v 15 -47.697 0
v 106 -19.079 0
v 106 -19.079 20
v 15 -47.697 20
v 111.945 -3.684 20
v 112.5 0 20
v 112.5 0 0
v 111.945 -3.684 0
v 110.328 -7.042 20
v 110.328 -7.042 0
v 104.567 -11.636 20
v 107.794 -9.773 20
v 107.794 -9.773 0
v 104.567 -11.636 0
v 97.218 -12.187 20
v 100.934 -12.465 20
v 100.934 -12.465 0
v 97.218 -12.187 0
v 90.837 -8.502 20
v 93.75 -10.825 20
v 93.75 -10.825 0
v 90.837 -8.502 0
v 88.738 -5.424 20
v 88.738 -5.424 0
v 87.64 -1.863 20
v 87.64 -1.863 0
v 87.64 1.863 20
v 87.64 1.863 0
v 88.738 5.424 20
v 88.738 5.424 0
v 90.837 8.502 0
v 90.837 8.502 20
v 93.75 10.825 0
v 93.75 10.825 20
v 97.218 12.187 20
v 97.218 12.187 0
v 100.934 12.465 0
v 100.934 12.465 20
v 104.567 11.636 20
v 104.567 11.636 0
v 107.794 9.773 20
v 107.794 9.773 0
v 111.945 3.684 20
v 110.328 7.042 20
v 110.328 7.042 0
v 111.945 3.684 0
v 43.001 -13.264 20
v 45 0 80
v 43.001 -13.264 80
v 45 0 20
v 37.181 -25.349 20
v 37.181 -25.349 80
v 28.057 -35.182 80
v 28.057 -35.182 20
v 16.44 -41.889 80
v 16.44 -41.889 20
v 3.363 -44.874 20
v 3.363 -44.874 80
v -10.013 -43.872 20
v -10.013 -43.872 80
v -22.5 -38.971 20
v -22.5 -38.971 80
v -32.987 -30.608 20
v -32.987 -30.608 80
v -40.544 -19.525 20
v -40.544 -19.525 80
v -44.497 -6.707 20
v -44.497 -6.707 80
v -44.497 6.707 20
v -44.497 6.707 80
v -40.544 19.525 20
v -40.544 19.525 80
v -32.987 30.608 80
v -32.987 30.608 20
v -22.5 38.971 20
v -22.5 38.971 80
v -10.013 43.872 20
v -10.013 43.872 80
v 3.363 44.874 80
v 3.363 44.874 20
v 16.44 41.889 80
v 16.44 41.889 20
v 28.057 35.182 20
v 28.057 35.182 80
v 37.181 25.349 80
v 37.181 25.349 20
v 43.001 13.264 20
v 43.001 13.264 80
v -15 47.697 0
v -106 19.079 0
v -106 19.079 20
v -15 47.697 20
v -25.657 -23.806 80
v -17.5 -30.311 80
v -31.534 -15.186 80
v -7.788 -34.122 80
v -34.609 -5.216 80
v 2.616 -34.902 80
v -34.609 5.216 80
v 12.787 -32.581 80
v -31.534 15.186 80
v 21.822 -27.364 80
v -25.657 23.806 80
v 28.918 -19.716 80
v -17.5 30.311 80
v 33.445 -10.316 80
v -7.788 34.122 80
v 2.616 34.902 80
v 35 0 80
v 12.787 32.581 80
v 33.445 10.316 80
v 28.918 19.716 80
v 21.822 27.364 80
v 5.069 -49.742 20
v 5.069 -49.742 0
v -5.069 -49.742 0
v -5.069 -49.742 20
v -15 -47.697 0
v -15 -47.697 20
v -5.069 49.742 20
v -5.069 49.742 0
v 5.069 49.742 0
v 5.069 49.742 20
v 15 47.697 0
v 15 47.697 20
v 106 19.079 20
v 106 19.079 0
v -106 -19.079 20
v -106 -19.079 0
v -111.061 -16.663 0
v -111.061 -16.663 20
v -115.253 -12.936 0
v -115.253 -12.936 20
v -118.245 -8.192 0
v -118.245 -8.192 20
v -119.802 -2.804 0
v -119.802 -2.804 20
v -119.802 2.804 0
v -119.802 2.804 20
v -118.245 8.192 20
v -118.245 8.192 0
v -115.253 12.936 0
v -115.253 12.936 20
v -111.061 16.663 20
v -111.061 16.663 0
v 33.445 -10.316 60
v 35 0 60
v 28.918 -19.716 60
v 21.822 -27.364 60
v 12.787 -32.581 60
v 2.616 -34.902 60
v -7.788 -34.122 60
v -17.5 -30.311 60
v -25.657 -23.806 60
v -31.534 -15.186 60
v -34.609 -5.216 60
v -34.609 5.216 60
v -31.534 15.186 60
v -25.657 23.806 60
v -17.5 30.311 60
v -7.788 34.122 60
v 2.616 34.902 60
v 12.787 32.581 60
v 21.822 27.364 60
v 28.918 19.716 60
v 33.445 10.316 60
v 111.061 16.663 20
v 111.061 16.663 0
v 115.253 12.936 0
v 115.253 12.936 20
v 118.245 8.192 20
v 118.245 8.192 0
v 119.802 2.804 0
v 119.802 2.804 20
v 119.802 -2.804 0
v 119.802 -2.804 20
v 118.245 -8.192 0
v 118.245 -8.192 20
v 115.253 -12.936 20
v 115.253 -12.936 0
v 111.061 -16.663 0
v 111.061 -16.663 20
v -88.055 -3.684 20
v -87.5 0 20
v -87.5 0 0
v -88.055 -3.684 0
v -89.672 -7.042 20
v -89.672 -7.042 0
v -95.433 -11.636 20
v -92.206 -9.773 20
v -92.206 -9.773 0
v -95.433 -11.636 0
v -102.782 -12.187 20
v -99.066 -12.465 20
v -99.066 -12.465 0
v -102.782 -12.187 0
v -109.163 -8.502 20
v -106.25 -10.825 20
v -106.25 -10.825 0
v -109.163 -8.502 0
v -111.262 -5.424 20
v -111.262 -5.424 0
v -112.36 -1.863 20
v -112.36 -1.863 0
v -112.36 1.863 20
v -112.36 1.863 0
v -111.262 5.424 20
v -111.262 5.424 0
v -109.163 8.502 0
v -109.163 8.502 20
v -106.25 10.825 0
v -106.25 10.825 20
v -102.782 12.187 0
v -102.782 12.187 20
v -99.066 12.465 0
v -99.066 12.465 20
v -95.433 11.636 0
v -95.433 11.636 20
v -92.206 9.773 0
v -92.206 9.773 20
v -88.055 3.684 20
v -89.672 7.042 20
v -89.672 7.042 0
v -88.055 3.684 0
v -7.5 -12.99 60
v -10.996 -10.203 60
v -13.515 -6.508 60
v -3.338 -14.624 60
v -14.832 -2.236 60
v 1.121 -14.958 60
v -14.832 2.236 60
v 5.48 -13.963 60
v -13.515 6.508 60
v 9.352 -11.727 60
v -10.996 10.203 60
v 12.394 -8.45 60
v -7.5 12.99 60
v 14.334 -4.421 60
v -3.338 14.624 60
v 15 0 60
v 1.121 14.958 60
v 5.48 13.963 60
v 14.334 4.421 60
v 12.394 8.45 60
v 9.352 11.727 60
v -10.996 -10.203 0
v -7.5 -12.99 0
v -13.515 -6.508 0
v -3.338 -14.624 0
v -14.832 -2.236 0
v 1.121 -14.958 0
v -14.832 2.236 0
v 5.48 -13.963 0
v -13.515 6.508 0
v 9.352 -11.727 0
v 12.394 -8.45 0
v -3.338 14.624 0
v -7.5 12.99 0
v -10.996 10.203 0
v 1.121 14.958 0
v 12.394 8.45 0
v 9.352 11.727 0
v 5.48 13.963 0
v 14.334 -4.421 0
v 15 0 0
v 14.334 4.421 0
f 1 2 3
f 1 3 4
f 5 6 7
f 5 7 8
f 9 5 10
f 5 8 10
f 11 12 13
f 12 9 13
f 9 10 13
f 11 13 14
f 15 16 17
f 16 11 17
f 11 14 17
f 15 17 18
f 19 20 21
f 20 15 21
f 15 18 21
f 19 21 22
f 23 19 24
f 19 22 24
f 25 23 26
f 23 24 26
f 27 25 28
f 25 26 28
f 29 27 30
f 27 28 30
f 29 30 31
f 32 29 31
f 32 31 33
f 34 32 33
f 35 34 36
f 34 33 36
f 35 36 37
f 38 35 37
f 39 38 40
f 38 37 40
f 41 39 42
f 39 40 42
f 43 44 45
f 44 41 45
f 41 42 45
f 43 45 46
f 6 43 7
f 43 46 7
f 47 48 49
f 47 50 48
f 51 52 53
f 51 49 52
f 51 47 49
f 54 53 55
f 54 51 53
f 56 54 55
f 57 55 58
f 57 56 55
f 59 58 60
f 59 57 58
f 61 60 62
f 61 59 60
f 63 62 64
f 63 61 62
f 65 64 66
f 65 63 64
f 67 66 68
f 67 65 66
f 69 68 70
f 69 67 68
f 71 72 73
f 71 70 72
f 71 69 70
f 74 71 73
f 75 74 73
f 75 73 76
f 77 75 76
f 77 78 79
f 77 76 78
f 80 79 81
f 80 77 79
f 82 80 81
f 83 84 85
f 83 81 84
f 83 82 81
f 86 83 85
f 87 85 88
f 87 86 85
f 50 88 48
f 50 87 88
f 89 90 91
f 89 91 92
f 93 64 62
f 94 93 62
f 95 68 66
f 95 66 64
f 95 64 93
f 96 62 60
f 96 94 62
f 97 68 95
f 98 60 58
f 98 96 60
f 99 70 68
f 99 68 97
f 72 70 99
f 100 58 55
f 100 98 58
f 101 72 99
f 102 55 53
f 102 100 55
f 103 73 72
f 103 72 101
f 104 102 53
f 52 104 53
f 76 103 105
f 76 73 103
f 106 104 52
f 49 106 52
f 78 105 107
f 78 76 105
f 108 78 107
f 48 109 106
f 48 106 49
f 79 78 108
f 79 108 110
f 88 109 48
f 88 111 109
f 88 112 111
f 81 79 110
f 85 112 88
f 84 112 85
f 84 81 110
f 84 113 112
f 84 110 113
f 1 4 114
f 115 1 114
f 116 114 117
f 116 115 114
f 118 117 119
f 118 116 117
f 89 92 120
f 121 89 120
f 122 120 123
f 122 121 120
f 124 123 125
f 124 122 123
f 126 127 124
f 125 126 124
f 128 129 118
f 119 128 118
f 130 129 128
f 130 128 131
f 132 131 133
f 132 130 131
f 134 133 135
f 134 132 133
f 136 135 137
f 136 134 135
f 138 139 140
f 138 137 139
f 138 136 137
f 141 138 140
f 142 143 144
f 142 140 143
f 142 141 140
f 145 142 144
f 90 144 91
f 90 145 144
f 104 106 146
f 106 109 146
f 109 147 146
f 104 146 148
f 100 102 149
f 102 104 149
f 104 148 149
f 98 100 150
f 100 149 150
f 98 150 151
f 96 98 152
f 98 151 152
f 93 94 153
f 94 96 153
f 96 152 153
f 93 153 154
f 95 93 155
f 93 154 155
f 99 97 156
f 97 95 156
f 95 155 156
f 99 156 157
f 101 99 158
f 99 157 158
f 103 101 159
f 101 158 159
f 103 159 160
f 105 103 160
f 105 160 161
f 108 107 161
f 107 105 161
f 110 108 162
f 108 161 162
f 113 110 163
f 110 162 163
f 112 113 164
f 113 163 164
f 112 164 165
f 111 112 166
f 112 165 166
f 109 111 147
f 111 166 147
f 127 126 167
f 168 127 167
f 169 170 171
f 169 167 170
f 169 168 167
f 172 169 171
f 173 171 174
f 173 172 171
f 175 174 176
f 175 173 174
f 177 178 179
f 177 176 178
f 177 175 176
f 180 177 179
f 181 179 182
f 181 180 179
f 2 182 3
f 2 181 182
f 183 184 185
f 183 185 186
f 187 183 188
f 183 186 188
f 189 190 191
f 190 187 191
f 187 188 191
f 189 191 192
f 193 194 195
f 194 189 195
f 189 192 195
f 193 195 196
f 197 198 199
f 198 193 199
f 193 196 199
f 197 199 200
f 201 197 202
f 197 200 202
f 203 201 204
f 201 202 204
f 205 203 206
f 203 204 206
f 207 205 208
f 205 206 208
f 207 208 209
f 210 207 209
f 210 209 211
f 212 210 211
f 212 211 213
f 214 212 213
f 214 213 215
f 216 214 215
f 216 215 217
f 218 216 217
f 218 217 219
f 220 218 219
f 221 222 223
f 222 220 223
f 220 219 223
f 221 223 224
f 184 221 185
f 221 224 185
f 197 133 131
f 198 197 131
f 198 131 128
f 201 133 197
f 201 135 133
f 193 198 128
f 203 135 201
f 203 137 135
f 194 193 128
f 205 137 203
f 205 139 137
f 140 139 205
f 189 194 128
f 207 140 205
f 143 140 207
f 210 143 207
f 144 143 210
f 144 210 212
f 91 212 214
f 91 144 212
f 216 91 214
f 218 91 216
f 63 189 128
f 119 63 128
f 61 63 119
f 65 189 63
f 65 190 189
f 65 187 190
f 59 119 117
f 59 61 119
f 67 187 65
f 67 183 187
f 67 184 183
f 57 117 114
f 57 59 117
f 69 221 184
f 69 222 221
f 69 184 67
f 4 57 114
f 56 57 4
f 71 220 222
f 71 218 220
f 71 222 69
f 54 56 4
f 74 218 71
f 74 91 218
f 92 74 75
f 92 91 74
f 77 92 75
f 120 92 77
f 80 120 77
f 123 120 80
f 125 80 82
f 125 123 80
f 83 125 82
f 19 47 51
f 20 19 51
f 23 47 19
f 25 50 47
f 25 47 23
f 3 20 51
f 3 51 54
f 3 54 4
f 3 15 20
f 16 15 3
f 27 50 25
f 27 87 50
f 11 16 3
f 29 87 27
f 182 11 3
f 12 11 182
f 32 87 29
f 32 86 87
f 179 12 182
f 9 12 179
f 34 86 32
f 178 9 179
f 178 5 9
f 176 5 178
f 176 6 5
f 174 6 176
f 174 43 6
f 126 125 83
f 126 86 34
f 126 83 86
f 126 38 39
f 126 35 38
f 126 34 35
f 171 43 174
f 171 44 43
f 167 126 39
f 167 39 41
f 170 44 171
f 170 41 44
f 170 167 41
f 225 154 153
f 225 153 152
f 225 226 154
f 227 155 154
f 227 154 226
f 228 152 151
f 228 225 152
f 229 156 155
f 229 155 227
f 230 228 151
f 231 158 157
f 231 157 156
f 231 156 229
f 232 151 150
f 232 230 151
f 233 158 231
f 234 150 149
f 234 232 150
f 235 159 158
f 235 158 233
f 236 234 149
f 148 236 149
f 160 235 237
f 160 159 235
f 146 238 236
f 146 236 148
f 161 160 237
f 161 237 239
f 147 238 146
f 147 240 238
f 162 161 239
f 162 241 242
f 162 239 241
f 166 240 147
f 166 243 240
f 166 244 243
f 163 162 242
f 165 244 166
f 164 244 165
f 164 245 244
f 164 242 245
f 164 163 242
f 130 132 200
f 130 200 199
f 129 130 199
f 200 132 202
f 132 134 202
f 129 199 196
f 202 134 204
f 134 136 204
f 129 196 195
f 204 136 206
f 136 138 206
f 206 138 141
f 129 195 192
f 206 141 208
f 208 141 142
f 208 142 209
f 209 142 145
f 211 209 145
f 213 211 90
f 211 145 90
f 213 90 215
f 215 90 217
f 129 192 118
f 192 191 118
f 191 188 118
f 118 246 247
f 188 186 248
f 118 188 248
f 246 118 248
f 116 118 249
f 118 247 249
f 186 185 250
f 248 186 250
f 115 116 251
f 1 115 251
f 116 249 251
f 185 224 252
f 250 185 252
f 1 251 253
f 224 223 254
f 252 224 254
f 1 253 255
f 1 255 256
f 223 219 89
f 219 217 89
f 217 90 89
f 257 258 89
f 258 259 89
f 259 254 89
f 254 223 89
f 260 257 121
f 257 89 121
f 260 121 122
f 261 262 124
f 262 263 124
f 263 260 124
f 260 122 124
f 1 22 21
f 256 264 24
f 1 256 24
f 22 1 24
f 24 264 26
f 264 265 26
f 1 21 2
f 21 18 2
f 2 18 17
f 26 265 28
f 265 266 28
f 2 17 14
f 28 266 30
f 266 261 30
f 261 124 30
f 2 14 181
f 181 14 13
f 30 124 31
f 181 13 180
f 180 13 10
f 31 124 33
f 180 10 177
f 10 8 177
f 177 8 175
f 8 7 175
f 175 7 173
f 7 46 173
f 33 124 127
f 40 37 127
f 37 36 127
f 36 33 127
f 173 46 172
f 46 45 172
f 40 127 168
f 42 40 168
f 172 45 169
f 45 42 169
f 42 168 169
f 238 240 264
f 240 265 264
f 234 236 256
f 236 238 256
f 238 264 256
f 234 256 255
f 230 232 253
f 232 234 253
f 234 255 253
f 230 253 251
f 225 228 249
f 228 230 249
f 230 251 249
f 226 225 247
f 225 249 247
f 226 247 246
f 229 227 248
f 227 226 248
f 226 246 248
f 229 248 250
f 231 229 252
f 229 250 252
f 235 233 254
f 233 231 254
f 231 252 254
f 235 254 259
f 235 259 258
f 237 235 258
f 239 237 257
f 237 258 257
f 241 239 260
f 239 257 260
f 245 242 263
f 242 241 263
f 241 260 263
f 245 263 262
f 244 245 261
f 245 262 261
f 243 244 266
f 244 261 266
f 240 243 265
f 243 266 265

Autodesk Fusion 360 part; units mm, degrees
sketch "Sketch1" plane through (0, 0, 0) normal (0, 0, 1) x (1, 0, 0)
  circle A0 centre (0, 0) radius 15
  circle A1 centre (0, 0) radius 35
  circle A2 centre (0, 0) radius 45
  line L0 (-100, -20.9657) -> (-100, -80.0578) construction
  circle A3 centre (-100, 0) radius 12.5
  circle A4 centre (100, 0) radius 12.5
  line L1 (-106, 19.0788) -> (-15, 47.697)
  arc A5 (-106, 19.0788) -> (-106, -19.0788) centre (-100, 0) ccw
  line L2 (-106, -19.0788) -> (-15, -47.697)
  line L3 (106, 19.0788) -> (15, 47.697)
  line L4 (106, -19.0788) -> (15, -47.697)
  arc A6 (-15, -47.697) -> (15, -47.697) centre (0, 0) ccw
  arc A7 (15, 47.697) -> (-15, 47.697) centre (0, 0) ccw
  line L5 (100, -15) -> (100, -80.0578) construction
  line L6 (-100, 50) -> (-100, 80.9539) construction
  arc A8 (100, -20) -> (106, 19.0788) centre (100, 0) ccw
  dimension "d1" = 30
  dimension "d2" = 70
  dimension "d3" = 90
  dimension "d4" = 100
  dimension "d7" = 25
  dimension "d8" = 40
extrude "Extrude1" add sketch "Sketch1" along normal blind 20 contours L1 A5 L2 L3 L4 A6 A7 A8
extrude "Extrude2" add sketch "Sketch1" along normal blind 80 contours A2
extrude "Extrude3" add sketch "Sketch1" along normal blind 60 contours A1
